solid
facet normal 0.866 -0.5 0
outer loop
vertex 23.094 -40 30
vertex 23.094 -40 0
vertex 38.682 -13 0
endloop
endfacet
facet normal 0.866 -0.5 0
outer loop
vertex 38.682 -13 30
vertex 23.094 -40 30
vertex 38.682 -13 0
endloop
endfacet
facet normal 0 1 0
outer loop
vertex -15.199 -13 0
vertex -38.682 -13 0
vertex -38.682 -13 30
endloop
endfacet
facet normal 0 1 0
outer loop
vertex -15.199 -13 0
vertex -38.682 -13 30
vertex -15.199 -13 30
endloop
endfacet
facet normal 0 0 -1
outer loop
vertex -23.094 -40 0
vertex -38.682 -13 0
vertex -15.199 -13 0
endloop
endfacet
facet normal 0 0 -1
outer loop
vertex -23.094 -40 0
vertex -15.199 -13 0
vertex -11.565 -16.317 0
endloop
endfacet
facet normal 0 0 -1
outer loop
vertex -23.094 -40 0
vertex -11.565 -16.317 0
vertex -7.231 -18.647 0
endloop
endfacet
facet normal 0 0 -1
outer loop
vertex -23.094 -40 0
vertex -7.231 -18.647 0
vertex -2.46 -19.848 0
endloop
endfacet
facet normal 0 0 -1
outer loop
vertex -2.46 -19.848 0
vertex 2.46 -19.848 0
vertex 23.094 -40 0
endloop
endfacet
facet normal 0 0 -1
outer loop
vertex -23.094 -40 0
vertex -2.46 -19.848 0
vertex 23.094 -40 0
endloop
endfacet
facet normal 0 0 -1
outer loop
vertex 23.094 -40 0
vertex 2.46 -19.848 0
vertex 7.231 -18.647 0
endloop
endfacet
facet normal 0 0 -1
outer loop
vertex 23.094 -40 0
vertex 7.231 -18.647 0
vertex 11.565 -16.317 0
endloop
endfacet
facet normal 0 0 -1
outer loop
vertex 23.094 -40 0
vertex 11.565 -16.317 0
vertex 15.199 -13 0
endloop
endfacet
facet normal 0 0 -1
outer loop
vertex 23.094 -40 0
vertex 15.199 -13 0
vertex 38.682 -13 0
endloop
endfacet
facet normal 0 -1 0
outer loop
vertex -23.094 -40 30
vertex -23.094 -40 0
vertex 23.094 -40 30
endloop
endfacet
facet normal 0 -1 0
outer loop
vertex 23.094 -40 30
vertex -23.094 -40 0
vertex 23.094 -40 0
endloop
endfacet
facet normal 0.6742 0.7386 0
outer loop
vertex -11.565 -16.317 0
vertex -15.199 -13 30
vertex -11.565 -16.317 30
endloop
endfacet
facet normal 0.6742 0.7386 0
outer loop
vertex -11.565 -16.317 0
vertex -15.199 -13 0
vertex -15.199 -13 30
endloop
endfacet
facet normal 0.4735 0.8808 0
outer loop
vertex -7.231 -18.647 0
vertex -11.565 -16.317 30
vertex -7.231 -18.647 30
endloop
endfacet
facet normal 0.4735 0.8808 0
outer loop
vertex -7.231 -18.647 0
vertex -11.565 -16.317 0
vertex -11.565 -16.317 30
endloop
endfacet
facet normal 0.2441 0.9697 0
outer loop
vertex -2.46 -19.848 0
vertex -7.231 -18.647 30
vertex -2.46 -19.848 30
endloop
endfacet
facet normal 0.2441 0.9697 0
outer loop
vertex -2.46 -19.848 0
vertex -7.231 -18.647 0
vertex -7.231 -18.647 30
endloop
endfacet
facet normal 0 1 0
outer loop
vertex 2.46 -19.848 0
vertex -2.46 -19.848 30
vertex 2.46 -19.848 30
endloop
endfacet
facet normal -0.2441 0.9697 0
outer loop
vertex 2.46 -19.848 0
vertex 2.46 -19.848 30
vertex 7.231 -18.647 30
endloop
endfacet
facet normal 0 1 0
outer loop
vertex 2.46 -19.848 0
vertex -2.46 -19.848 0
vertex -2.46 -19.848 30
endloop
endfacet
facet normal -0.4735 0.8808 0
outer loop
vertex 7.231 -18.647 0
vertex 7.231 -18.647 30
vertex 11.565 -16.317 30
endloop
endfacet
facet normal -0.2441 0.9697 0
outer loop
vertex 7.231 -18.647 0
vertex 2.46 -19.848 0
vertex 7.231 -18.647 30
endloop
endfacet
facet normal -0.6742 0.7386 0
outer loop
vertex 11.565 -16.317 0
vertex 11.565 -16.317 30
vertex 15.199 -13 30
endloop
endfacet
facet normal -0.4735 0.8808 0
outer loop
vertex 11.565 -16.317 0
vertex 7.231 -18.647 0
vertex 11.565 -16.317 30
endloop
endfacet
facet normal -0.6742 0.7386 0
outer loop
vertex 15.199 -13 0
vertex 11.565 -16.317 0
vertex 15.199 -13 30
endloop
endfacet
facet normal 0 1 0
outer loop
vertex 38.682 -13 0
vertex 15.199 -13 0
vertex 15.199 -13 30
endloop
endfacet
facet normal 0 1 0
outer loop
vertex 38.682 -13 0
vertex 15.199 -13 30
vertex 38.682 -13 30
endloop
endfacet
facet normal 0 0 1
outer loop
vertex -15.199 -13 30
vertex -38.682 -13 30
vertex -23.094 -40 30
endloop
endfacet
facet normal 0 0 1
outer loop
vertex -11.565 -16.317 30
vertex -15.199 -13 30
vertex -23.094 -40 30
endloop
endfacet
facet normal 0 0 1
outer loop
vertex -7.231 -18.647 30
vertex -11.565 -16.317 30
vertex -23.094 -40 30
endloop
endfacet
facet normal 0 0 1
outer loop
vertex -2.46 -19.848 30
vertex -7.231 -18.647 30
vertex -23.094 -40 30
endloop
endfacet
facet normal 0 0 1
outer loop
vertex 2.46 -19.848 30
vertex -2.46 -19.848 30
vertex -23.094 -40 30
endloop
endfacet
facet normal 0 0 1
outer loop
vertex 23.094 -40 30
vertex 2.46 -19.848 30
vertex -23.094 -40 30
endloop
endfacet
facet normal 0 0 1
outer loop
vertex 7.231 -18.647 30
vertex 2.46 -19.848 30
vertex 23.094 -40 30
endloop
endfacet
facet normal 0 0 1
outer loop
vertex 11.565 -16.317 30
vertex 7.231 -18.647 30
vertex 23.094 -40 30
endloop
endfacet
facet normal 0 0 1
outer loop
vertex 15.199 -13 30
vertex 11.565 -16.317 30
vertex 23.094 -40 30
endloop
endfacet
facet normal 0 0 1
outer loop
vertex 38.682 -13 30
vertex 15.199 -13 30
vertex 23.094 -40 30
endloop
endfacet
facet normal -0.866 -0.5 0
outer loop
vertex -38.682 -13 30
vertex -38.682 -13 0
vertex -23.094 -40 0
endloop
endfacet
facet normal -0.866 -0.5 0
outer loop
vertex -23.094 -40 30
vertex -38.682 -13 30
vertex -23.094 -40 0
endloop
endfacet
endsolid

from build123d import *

# Parameters (mm, degrees)
SKETCH_1_R          = 20
EXTRUDE_1_DEPTH     = 30
SKETCH_2_W          = 102.73425285
SKETCH_2_H          = 41.168069265
CUT_EXTRUDE_1_DEPTH = 89
SKETCH_3_W          = 92.921845771
SKETCH_3_H          = 3
CUT_EXTRUDE_2_DEPTH = 89
SKETCH_5_W          = 89.254796613
SKETCH_5_H          = 10
CUT_EXTRUDE_3_DEPTH = 31


with BuildPart() as part:
    # 스케치1 → 보스-돌출1 (new body)
    with BuildSketch(Plane.XY):
        Polygon((46.188021535, 0), (23.094010768, 40), (-23.094010768, 40), (-46.188021535, 0), (-23.094010768, -40), (23.094010768, -40), align=None)
        Circle(SKETCH_1_R, mode=Mode.SUBTRACT)
    extrude(amount=EXTRUDE_1_DEPTH)

    # 스케치2 → 컷-돌출1 (cut)
    with BuildSketch(Plane.XY):
        with Locations((0.690561162, 20.584034632)):
            Rectangle(SKETCH_2_W, SKETCH_2_H)
    extrude(amount=CUT_EXTRUDE_1_DEPTH, mode=Mode.SUBTRACT)

    # 스케치3 → 컷-돌출2 (cut)
    with BuildSketch(Plane.XY.offset(30)):
        with Locations((-0.27290135, -1.5)):
            Rectangle(SKETCH_3_W, SKETCH_3_H)
    extrude(amount=-CUT_EXTRUDE_2_DEPTH, mode=Mode.SUBTRACT)

    # 스케치5 → 컷-돌출3 (cut, through all)
    with BuildSketch(Plane.XY.offset(30)):
        with Locations((-0.171427578, -8)):
            Rectangle(SKETCH_5_W, SKETCH_5_H)
    extrude(amount=-CUT_EXTRUDE_3_DEPTH, mode=Mode.SUBTRACT)


solid = part.part
